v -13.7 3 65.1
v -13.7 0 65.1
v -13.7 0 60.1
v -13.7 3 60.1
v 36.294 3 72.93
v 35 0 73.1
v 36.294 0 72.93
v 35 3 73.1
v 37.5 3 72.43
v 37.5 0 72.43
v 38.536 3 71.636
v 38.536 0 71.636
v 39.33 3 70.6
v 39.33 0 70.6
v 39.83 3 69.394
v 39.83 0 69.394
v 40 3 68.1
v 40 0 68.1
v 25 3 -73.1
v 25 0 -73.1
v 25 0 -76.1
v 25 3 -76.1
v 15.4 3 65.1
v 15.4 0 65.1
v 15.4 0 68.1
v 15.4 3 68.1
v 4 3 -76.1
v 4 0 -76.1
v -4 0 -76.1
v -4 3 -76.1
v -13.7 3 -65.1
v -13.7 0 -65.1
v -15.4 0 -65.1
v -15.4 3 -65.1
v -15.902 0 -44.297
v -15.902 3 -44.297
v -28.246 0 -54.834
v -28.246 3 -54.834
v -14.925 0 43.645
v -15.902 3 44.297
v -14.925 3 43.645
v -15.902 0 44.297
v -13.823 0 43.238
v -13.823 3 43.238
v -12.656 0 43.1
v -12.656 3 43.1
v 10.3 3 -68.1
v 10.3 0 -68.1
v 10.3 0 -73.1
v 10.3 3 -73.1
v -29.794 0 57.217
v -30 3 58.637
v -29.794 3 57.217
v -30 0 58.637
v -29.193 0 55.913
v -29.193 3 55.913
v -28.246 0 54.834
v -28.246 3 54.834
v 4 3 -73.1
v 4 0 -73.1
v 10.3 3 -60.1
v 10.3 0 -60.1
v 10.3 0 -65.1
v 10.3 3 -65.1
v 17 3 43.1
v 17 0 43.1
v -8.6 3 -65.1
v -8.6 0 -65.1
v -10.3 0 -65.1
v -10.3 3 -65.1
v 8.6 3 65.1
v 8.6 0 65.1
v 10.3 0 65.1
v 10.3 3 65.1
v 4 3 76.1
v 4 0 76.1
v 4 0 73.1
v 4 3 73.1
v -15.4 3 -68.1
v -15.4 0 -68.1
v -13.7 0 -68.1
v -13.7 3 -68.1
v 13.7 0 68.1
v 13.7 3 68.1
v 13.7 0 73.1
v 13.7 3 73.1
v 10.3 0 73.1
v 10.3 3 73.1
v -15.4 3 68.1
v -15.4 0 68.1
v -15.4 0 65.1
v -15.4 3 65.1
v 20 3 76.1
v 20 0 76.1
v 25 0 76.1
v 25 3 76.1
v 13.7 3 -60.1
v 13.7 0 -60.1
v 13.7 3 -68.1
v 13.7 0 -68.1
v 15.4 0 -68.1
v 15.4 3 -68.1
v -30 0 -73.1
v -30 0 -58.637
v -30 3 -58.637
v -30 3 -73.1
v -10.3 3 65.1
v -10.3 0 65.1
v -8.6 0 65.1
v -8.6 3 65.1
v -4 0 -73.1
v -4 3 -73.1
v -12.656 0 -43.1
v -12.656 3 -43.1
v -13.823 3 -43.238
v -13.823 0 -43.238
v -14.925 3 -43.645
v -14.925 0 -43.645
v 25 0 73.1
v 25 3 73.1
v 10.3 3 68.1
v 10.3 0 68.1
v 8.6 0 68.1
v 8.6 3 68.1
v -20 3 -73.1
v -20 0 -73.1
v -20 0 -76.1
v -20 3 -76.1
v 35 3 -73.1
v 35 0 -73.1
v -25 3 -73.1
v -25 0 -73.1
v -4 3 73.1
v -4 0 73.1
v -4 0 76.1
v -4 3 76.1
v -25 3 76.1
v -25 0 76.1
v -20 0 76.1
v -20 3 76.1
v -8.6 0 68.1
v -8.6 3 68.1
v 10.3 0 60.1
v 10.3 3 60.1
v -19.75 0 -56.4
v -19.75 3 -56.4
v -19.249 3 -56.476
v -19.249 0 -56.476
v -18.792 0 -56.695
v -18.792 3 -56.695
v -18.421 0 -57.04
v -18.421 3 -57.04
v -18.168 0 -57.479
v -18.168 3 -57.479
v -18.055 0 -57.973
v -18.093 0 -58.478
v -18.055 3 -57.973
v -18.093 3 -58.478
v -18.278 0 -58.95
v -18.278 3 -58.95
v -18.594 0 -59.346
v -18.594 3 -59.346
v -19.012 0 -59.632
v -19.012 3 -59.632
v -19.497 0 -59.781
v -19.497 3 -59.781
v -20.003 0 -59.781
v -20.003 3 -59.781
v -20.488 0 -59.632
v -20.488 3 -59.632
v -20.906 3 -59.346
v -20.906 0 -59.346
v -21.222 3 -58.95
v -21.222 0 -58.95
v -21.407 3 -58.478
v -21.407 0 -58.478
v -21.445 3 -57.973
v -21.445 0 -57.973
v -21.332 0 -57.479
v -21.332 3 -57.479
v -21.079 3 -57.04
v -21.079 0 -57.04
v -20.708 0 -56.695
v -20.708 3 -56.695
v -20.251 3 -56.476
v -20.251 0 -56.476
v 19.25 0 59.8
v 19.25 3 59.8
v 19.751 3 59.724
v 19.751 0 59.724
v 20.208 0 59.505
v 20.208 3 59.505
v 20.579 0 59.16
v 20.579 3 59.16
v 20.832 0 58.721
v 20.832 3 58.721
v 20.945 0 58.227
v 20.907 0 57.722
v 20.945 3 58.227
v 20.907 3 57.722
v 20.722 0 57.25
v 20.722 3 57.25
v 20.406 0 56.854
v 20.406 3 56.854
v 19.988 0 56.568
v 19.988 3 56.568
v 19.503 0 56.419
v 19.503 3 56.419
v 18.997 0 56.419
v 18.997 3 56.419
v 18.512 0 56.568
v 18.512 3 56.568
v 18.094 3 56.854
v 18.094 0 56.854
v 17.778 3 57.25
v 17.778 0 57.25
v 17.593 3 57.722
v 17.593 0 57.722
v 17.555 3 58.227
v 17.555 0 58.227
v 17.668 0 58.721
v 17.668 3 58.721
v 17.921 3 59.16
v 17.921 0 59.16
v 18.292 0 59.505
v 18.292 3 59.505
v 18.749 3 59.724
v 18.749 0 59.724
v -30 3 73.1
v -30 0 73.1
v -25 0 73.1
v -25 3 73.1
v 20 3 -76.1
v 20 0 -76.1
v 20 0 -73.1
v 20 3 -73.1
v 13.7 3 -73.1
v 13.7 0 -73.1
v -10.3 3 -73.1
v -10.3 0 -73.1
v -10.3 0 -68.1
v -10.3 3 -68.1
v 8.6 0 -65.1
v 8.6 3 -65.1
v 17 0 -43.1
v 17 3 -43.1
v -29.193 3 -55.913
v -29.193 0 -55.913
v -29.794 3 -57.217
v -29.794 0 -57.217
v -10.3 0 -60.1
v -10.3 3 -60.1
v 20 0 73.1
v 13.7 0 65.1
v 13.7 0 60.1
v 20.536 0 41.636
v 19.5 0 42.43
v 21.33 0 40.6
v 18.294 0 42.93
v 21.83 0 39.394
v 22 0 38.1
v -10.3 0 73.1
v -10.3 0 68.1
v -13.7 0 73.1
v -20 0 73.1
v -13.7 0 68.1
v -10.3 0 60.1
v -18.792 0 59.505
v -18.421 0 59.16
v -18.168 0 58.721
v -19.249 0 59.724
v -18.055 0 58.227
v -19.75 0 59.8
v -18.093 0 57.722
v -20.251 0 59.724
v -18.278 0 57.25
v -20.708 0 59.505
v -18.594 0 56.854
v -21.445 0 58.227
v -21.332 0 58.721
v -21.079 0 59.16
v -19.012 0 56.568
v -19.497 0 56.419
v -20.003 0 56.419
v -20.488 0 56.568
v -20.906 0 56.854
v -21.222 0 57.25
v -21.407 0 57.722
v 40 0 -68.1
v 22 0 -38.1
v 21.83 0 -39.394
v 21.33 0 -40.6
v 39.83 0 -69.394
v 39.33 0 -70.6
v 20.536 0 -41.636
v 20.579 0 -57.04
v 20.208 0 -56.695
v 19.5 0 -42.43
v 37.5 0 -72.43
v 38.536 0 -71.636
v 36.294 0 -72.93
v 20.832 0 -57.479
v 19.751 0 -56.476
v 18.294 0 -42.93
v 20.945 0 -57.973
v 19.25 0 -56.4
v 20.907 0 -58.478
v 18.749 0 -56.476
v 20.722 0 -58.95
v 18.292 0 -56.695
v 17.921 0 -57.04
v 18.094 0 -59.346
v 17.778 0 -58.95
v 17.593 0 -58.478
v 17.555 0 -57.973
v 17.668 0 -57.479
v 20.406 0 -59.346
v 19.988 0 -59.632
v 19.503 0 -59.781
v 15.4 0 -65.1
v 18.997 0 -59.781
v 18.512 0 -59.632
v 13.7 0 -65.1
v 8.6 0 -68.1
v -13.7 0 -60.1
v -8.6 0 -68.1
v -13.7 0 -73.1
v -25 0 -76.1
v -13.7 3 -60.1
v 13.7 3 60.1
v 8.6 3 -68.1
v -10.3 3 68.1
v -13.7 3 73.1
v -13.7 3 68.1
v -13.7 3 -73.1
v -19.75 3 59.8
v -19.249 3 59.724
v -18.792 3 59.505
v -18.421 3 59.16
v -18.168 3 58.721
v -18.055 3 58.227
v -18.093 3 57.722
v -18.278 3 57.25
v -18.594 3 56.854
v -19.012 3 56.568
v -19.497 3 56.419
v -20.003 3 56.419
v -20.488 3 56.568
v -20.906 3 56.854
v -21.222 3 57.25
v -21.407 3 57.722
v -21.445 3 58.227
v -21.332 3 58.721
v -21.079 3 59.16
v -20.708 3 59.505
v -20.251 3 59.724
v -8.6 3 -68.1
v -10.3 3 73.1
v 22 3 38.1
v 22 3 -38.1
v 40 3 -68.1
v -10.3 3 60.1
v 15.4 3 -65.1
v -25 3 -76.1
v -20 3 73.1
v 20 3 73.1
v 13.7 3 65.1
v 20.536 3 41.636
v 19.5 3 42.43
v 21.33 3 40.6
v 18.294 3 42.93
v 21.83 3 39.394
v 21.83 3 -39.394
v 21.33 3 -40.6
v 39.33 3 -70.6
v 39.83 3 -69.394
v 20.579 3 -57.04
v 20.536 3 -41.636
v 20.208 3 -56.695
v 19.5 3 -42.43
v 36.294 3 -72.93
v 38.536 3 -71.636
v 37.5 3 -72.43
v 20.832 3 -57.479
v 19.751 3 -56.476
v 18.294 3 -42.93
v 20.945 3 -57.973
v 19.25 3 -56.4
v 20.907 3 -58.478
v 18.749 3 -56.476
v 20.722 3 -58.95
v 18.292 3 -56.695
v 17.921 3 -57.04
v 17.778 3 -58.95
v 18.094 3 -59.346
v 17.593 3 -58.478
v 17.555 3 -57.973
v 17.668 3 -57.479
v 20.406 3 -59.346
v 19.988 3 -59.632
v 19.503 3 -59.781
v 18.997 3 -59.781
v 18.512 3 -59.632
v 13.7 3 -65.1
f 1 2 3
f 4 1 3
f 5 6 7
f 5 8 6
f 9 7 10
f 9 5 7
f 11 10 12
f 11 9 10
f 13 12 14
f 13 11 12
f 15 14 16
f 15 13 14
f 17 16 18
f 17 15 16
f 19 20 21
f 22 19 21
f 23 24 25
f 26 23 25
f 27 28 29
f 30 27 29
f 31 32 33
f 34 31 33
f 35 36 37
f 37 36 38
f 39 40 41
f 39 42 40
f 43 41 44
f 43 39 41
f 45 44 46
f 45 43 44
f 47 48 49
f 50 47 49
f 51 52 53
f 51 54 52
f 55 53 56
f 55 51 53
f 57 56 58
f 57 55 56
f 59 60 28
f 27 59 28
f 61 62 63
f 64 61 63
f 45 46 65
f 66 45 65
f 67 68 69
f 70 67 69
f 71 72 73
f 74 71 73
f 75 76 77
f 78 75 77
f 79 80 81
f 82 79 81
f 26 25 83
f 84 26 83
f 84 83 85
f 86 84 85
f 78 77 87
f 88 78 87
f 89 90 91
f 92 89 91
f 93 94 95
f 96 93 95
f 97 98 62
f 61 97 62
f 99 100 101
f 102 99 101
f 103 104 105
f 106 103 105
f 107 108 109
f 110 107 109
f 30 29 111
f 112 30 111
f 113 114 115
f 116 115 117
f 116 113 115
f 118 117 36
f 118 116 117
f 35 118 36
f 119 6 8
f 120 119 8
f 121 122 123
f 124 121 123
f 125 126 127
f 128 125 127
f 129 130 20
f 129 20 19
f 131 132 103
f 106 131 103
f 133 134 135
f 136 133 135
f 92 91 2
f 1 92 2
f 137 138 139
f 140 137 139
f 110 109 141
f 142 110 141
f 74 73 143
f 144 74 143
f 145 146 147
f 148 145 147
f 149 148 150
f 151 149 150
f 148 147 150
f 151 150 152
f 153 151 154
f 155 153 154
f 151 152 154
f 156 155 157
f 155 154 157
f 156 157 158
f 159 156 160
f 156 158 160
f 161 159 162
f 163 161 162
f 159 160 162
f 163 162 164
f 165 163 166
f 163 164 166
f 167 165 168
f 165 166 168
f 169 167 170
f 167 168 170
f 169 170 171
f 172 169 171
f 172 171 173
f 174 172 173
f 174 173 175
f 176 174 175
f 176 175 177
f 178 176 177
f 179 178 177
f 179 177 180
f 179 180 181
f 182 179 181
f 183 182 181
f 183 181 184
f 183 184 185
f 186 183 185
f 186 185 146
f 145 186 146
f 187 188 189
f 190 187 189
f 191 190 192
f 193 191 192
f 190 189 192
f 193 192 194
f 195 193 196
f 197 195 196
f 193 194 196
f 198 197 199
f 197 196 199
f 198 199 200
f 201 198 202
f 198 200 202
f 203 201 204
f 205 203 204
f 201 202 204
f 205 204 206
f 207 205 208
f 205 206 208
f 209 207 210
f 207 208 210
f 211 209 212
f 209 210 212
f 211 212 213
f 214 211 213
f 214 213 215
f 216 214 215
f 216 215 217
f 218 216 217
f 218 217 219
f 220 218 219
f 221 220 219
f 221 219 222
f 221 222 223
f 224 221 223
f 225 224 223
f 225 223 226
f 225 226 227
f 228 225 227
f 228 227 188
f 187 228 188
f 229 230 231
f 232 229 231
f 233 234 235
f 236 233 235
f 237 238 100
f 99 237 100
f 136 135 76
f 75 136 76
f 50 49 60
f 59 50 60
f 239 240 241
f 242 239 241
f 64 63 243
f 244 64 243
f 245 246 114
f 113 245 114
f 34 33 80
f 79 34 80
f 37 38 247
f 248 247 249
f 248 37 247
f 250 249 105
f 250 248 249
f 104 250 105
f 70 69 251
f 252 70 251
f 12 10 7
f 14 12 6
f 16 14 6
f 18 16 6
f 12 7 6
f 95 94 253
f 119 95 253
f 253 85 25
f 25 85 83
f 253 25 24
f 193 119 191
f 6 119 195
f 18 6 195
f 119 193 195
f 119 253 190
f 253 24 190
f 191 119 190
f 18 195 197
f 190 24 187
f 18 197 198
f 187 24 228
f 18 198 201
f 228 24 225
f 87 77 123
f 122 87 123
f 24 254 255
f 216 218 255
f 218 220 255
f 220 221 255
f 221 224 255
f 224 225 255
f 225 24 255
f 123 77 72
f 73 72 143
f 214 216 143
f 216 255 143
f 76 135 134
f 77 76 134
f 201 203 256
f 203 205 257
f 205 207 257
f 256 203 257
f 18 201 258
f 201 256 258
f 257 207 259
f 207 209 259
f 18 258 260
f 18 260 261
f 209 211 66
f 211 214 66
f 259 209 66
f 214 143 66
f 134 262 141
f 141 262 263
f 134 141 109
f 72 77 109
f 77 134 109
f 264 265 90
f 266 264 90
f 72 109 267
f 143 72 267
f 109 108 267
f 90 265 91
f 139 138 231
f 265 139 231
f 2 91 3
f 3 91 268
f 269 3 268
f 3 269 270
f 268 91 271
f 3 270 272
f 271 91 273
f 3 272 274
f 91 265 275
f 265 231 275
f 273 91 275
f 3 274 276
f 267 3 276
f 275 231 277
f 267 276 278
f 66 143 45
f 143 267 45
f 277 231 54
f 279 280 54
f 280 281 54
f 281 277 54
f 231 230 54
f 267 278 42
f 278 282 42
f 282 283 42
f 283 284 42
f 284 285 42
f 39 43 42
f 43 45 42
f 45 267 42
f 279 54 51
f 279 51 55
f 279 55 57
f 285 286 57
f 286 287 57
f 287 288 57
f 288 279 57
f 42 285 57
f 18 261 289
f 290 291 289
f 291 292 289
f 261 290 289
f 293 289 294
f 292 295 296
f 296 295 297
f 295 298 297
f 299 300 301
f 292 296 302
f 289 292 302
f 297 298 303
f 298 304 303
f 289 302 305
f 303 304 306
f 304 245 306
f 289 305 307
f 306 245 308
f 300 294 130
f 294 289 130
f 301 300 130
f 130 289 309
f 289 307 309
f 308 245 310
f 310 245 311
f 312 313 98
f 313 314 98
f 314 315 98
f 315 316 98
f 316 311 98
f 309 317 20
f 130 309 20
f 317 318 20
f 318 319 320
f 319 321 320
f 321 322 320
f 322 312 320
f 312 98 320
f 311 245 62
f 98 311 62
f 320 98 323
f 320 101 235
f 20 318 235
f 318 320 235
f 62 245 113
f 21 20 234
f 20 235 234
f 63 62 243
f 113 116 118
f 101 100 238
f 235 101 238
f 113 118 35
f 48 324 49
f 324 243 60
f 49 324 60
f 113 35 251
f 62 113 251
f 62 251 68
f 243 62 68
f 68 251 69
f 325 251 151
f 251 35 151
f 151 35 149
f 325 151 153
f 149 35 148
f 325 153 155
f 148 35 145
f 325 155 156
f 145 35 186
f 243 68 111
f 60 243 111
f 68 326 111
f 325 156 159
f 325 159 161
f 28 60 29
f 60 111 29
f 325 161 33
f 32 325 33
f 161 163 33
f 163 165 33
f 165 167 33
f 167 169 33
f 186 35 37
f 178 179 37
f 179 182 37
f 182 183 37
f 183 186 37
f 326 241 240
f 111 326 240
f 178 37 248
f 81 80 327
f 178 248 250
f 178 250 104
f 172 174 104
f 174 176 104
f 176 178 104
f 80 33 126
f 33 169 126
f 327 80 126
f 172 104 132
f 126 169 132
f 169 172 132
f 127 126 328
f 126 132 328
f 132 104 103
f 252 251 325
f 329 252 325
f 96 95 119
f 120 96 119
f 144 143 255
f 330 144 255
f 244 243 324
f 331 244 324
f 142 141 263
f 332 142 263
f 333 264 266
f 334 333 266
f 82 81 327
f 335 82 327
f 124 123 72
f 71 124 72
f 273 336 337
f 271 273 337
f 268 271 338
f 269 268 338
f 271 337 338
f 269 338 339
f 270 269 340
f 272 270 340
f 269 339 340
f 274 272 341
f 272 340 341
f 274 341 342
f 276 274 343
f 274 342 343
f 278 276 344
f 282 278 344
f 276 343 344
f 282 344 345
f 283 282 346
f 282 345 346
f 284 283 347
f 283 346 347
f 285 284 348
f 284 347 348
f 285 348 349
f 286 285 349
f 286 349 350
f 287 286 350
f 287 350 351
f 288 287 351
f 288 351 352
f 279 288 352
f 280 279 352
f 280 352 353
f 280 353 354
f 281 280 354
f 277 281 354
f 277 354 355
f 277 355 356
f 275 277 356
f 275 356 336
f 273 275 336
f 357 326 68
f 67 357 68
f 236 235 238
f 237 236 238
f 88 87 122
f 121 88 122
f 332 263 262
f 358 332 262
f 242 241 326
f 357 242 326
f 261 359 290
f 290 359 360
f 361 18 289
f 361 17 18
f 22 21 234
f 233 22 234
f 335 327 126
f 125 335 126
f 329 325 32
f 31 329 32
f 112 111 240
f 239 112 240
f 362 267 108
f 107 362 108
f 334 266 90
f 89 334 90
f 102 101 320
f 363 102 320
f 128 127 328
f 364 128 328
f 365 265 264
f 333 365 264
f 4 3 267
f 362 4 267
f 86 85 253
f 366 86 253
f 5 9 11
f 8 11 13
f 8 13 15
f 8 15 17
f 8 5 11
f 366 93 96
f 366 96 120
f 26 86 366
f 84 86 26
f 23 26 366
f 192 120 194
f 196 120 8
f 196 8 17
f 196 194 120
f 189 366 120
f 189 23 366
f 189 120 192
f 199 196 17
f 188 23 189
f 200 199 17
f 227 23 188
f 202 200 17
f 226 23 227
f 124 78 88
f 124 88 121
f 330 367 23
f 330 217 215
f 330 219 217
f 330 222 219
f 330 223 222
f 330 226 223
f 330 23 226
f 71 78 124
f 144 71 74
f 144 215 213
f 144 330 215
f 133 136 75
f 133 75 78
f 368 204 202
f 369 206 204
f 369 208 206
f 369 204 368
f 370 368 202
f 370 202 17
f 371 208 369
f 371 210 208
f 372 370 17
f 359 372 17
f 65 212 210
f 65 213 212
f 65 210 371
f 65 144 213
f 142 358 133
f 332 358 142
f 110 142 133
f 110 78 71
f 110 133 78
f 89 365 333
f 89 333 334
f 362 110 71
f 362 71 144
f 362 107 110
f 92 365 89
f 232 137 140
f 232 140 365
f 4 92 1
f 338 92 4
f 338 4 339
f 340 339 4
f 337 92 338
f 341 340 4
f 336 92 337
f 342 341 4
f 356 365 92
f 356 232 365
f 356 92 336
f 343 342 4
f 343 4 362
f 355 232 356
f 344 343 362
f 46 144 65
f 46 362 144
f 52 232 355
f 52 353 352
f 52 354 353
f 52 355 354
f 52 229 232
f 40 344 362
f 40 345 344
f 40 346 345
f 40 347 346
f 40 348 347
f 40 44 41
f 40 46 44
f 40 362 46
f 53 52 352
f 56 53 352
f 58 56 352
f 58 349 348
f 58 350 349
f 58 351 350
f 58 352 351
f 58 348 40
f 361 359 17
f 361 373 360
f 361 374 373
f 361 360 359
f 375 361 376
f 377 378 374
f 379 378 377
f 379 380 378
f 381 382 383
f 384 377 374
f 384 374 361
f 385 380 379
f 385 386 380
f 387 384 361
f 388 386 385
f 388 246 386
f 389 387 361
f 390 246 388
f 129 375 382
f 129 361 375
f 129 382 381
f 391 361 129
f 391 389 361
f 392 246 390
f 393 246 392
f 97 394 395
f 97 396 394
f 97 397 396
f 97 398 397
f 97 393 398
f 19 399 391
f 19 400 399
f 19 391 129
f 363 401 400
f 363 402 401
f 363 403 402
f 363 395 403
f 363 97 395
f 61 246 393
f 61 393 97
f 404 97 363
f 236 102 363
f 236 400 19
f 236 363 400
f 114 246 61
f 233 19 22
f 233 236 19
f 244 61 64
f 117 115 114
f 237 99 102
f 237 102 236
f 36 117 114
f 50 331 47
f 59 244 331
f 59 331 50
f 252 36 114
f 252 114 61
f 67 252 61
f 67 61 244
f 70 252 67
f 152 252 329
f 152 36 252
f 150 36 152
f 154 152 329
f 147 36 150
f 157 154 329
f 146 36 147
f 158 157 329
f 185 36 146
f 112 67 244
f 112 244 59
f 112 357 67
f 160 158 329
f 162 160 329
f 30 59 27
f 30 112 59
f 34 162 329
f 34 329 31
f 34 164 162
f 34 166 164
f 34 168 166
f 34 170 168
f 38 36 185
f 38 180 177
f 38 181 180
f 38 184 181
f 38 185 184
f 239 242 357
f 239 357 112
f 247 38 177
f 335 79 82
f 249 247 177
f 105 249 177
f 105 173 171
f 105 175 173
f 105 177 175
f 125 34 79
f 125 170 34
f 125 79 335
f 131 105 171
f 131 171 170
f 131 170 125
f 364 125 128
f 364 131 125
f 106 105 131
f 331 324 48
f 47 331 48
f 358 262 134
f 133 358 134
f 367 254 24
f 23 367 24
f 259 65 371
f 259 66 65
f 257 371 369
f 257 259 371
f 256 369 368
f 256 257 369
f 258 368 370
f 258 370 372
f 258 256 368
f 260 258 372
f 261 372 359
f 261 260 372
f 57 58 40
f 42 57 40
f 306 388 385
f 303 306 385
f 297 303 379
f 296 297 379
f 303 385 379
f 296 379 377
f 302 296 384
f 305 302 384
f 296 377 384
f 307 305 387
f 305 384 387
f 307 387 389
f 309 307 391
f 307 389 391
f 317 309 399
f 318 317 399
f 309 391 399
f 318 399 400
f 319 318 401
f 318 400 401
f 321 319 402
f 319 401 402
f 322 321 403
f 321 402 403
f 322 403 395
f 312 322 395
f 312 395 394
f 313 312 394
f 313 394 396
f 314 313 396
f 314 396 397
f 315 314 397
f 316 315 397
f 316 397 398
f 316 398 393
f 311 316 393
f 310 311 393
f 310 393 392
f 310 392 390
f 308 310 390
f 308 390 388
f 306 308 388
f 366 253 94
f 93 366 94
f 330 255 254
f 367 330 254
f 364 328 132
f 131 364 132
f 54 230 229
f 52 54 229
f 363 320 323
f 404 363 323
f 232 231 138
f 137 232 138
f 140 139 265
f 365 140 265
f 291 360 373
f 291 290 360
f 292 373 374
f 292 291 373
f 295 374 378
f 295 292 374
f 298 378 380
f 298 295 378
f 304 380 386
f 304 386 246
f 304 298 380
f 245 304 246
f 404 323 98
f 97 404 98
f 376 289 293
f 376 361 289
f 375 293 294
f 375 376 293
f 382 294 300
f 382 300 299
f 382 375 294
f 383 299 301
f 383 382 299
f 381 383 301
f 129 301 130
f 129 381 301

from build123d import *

# Parameters (mm, degrees)
EXTRUDE_1_DEPTH     = 3
SKETCH_2_W          = 5
SKETCH_2_H          = 3
CUT_EXTRUDE_1_DEPTH = 176
SKETCH_3_W          = 146.2
SKETCH_3_H          = 3
EXTRUDE_2_DEPTH     = 5
SKETCH_4_R          = 1.7
CUT_EXTRUDE_2_DEPTH = 5
CUT_EXTRUDE_3_DEPTH = 10
FILLET_1_R          = 5
FILLET_2_R          = 5


with BuildPart() as part:
    # 草图1 → 凸台-拉伸1 (new body)
    with BuildSketch(Plane(origin=(0, 0, 0), x_dir=(1, 0, 0), z_dir=(0, 1, 0))):
        Polygon((-25, -73.1), (-25, -76.1), (-20, -76.1), (-20, -73.1), (-13.7, -73.1), (-13.7, -68.1), (-15.4, -68.1), (-15.4, -65.1), (-13.7, -65.1), (-13.7, -60.1), (-10.3, -60.1), (-10.3, -65.1), (-8.6, -65.1), (-8.6, -68.1), (-10.3, -68.1), (-10.3, -73.1), (-4, -73.1), (-4, -76.1), (4, -76.1), (4, -73.1), (10.3, -73.1), (10.3, -68.1), (8.6, -68.1), (8.6, -65.1), (10.3, -65.1), (10.3, -60.1), (13.7, -60.1), (13.7, -65.1), (15.4, -65.1), (15.4, -68.1), (13.7, -68.1), (13.7, -73.1), (20, -73.1), (20, -76.1), (25, -76.1), (25, -73.1), (35, -73.1), (35, 73.1), (25, 73.1), (25, 76.1), (20, 76.1), (20, 73.1), (13.7, 73.1), (13.7, 68.1), (15.4, 68.1), (15.4, 65.1), (13.7, 65.1), (13.7, 60.1), (10.3, 60.1), (10.3, 65.1), (8.6, 65.1), (8.6, 68.1), (10.3, 68.1), (10.3, 73.1), (4, 73.1), (4, 76.1), (-4, 76.1), (-4, 73.1), (-10.3, 73.1), (-10.3, 68.1), (-8.6, 68.1), (-8.6, 65.1), (-10.3, 65.1), (-10.3, 60.1), (-13.7, 60.1), (-13.7, 65.1), (-15.4, 65.1), (-15.4, 68.1), (-13.7, 68.1), (-13.7, 73.1), (-20, 73.1), (-20, 76.1), (-25, 76.1), (-25, 73.1), (-35, 73.1), (-35, -73.1), align=None)
    extrude(amount=EXTRUDE_1_DEPTH)

    # 草图2 → 切除-拉伸1 (cut)
    with BuildSketch(Plane.XY.offset(73.1)):
        with Locations((-32.5, 1.5)):
            Rectangle(SKETCH_2_W, SKETCH_2_H)
    extrude(amount=-CUT_EXTRUDE_1_DEPTH, mode=Mode.SUBTRACT)

    # 草图3 → 凸台-拉伸2 (add)
    with BuildSketch(Plane(origin=(35, 0, 0), x_dir=(0, 0, -1), z_dir=(1, 0, 0))):
        with Locations((0, 1.5)):
            Rectangle(SKETCH_3_W, SKETCH_3_H)
    extrude(amount=EXTRUDE_2_DEPTH)

    # 草图4 → 切除-拉伸2 (cut)
    with BuildSketch(Plane(origin=(0, 3, 0), x_dir=(1, 0, 0), z_dir=(0, 1, 0))):
        with Locations(Location((-19.75, -58.1, 0), (0, 0, 270))):
            Circle(SKETCH_4_R)
        with Locations(Location((19.25, -58.1, 0), (0, 0, 270))):
            Circle(SKETCH_4_R)
        with Locations(Location((19.25, 58.1, 0), (0, 0, 270))):
            Circle(SKETCH_4_R)
        with Locations(Location((-19.75, 58.1, 0), (0, 0, 270))):
            Circle(SKETCH_4_R)
    extrude(amount=-CUT_EXTRUDE_2_DEPTH, mode=Mode.SUBTRACT)

    # 草图5 → 切除-拉伸3 (cut)
    with BuildSketch(Plane(origin=(0, 3, 0), x_dir=(1, 0, 0), z_dir=(0, 1, 0))):
        Polygon((-30, -56.331395183), (-14.5, -43.1), (0, -43.1), (22, -43.1), (22, 43.1), (-14.5, 43.1), (-30, 56.331395183), align=None)
    extrude(amount=-CUT_EXTRUDE_3_DEPTH, mode=Mode.SUBTRACT)

    # 圆角1
    fillet_1_edges = [part.edges().sort_by_distance(p)[0] for p in [
        (-30, 1.5, 56.331395183),
        (-30, 1.5, -56.331395183),
        (-14.5, 1.5, -43.1),
        (22, 1.5, -43.1),
        (22, 1.5, 43.1),
        (-14.5, 1.5, 43.1),
    ]]
    fillet(fillet_1_edges, radius=FILLET_1_R)

    # 圆角2
    fillet_2_edges = [part.edges().sort_by_distance(p)[0] for p in [
        (40, 1.5, 73.1),
        (40, 1.5, -73.1),
    ]]
    fillet(fillet_2_edges, radius=FILLET_2_R)


solid = part.part
